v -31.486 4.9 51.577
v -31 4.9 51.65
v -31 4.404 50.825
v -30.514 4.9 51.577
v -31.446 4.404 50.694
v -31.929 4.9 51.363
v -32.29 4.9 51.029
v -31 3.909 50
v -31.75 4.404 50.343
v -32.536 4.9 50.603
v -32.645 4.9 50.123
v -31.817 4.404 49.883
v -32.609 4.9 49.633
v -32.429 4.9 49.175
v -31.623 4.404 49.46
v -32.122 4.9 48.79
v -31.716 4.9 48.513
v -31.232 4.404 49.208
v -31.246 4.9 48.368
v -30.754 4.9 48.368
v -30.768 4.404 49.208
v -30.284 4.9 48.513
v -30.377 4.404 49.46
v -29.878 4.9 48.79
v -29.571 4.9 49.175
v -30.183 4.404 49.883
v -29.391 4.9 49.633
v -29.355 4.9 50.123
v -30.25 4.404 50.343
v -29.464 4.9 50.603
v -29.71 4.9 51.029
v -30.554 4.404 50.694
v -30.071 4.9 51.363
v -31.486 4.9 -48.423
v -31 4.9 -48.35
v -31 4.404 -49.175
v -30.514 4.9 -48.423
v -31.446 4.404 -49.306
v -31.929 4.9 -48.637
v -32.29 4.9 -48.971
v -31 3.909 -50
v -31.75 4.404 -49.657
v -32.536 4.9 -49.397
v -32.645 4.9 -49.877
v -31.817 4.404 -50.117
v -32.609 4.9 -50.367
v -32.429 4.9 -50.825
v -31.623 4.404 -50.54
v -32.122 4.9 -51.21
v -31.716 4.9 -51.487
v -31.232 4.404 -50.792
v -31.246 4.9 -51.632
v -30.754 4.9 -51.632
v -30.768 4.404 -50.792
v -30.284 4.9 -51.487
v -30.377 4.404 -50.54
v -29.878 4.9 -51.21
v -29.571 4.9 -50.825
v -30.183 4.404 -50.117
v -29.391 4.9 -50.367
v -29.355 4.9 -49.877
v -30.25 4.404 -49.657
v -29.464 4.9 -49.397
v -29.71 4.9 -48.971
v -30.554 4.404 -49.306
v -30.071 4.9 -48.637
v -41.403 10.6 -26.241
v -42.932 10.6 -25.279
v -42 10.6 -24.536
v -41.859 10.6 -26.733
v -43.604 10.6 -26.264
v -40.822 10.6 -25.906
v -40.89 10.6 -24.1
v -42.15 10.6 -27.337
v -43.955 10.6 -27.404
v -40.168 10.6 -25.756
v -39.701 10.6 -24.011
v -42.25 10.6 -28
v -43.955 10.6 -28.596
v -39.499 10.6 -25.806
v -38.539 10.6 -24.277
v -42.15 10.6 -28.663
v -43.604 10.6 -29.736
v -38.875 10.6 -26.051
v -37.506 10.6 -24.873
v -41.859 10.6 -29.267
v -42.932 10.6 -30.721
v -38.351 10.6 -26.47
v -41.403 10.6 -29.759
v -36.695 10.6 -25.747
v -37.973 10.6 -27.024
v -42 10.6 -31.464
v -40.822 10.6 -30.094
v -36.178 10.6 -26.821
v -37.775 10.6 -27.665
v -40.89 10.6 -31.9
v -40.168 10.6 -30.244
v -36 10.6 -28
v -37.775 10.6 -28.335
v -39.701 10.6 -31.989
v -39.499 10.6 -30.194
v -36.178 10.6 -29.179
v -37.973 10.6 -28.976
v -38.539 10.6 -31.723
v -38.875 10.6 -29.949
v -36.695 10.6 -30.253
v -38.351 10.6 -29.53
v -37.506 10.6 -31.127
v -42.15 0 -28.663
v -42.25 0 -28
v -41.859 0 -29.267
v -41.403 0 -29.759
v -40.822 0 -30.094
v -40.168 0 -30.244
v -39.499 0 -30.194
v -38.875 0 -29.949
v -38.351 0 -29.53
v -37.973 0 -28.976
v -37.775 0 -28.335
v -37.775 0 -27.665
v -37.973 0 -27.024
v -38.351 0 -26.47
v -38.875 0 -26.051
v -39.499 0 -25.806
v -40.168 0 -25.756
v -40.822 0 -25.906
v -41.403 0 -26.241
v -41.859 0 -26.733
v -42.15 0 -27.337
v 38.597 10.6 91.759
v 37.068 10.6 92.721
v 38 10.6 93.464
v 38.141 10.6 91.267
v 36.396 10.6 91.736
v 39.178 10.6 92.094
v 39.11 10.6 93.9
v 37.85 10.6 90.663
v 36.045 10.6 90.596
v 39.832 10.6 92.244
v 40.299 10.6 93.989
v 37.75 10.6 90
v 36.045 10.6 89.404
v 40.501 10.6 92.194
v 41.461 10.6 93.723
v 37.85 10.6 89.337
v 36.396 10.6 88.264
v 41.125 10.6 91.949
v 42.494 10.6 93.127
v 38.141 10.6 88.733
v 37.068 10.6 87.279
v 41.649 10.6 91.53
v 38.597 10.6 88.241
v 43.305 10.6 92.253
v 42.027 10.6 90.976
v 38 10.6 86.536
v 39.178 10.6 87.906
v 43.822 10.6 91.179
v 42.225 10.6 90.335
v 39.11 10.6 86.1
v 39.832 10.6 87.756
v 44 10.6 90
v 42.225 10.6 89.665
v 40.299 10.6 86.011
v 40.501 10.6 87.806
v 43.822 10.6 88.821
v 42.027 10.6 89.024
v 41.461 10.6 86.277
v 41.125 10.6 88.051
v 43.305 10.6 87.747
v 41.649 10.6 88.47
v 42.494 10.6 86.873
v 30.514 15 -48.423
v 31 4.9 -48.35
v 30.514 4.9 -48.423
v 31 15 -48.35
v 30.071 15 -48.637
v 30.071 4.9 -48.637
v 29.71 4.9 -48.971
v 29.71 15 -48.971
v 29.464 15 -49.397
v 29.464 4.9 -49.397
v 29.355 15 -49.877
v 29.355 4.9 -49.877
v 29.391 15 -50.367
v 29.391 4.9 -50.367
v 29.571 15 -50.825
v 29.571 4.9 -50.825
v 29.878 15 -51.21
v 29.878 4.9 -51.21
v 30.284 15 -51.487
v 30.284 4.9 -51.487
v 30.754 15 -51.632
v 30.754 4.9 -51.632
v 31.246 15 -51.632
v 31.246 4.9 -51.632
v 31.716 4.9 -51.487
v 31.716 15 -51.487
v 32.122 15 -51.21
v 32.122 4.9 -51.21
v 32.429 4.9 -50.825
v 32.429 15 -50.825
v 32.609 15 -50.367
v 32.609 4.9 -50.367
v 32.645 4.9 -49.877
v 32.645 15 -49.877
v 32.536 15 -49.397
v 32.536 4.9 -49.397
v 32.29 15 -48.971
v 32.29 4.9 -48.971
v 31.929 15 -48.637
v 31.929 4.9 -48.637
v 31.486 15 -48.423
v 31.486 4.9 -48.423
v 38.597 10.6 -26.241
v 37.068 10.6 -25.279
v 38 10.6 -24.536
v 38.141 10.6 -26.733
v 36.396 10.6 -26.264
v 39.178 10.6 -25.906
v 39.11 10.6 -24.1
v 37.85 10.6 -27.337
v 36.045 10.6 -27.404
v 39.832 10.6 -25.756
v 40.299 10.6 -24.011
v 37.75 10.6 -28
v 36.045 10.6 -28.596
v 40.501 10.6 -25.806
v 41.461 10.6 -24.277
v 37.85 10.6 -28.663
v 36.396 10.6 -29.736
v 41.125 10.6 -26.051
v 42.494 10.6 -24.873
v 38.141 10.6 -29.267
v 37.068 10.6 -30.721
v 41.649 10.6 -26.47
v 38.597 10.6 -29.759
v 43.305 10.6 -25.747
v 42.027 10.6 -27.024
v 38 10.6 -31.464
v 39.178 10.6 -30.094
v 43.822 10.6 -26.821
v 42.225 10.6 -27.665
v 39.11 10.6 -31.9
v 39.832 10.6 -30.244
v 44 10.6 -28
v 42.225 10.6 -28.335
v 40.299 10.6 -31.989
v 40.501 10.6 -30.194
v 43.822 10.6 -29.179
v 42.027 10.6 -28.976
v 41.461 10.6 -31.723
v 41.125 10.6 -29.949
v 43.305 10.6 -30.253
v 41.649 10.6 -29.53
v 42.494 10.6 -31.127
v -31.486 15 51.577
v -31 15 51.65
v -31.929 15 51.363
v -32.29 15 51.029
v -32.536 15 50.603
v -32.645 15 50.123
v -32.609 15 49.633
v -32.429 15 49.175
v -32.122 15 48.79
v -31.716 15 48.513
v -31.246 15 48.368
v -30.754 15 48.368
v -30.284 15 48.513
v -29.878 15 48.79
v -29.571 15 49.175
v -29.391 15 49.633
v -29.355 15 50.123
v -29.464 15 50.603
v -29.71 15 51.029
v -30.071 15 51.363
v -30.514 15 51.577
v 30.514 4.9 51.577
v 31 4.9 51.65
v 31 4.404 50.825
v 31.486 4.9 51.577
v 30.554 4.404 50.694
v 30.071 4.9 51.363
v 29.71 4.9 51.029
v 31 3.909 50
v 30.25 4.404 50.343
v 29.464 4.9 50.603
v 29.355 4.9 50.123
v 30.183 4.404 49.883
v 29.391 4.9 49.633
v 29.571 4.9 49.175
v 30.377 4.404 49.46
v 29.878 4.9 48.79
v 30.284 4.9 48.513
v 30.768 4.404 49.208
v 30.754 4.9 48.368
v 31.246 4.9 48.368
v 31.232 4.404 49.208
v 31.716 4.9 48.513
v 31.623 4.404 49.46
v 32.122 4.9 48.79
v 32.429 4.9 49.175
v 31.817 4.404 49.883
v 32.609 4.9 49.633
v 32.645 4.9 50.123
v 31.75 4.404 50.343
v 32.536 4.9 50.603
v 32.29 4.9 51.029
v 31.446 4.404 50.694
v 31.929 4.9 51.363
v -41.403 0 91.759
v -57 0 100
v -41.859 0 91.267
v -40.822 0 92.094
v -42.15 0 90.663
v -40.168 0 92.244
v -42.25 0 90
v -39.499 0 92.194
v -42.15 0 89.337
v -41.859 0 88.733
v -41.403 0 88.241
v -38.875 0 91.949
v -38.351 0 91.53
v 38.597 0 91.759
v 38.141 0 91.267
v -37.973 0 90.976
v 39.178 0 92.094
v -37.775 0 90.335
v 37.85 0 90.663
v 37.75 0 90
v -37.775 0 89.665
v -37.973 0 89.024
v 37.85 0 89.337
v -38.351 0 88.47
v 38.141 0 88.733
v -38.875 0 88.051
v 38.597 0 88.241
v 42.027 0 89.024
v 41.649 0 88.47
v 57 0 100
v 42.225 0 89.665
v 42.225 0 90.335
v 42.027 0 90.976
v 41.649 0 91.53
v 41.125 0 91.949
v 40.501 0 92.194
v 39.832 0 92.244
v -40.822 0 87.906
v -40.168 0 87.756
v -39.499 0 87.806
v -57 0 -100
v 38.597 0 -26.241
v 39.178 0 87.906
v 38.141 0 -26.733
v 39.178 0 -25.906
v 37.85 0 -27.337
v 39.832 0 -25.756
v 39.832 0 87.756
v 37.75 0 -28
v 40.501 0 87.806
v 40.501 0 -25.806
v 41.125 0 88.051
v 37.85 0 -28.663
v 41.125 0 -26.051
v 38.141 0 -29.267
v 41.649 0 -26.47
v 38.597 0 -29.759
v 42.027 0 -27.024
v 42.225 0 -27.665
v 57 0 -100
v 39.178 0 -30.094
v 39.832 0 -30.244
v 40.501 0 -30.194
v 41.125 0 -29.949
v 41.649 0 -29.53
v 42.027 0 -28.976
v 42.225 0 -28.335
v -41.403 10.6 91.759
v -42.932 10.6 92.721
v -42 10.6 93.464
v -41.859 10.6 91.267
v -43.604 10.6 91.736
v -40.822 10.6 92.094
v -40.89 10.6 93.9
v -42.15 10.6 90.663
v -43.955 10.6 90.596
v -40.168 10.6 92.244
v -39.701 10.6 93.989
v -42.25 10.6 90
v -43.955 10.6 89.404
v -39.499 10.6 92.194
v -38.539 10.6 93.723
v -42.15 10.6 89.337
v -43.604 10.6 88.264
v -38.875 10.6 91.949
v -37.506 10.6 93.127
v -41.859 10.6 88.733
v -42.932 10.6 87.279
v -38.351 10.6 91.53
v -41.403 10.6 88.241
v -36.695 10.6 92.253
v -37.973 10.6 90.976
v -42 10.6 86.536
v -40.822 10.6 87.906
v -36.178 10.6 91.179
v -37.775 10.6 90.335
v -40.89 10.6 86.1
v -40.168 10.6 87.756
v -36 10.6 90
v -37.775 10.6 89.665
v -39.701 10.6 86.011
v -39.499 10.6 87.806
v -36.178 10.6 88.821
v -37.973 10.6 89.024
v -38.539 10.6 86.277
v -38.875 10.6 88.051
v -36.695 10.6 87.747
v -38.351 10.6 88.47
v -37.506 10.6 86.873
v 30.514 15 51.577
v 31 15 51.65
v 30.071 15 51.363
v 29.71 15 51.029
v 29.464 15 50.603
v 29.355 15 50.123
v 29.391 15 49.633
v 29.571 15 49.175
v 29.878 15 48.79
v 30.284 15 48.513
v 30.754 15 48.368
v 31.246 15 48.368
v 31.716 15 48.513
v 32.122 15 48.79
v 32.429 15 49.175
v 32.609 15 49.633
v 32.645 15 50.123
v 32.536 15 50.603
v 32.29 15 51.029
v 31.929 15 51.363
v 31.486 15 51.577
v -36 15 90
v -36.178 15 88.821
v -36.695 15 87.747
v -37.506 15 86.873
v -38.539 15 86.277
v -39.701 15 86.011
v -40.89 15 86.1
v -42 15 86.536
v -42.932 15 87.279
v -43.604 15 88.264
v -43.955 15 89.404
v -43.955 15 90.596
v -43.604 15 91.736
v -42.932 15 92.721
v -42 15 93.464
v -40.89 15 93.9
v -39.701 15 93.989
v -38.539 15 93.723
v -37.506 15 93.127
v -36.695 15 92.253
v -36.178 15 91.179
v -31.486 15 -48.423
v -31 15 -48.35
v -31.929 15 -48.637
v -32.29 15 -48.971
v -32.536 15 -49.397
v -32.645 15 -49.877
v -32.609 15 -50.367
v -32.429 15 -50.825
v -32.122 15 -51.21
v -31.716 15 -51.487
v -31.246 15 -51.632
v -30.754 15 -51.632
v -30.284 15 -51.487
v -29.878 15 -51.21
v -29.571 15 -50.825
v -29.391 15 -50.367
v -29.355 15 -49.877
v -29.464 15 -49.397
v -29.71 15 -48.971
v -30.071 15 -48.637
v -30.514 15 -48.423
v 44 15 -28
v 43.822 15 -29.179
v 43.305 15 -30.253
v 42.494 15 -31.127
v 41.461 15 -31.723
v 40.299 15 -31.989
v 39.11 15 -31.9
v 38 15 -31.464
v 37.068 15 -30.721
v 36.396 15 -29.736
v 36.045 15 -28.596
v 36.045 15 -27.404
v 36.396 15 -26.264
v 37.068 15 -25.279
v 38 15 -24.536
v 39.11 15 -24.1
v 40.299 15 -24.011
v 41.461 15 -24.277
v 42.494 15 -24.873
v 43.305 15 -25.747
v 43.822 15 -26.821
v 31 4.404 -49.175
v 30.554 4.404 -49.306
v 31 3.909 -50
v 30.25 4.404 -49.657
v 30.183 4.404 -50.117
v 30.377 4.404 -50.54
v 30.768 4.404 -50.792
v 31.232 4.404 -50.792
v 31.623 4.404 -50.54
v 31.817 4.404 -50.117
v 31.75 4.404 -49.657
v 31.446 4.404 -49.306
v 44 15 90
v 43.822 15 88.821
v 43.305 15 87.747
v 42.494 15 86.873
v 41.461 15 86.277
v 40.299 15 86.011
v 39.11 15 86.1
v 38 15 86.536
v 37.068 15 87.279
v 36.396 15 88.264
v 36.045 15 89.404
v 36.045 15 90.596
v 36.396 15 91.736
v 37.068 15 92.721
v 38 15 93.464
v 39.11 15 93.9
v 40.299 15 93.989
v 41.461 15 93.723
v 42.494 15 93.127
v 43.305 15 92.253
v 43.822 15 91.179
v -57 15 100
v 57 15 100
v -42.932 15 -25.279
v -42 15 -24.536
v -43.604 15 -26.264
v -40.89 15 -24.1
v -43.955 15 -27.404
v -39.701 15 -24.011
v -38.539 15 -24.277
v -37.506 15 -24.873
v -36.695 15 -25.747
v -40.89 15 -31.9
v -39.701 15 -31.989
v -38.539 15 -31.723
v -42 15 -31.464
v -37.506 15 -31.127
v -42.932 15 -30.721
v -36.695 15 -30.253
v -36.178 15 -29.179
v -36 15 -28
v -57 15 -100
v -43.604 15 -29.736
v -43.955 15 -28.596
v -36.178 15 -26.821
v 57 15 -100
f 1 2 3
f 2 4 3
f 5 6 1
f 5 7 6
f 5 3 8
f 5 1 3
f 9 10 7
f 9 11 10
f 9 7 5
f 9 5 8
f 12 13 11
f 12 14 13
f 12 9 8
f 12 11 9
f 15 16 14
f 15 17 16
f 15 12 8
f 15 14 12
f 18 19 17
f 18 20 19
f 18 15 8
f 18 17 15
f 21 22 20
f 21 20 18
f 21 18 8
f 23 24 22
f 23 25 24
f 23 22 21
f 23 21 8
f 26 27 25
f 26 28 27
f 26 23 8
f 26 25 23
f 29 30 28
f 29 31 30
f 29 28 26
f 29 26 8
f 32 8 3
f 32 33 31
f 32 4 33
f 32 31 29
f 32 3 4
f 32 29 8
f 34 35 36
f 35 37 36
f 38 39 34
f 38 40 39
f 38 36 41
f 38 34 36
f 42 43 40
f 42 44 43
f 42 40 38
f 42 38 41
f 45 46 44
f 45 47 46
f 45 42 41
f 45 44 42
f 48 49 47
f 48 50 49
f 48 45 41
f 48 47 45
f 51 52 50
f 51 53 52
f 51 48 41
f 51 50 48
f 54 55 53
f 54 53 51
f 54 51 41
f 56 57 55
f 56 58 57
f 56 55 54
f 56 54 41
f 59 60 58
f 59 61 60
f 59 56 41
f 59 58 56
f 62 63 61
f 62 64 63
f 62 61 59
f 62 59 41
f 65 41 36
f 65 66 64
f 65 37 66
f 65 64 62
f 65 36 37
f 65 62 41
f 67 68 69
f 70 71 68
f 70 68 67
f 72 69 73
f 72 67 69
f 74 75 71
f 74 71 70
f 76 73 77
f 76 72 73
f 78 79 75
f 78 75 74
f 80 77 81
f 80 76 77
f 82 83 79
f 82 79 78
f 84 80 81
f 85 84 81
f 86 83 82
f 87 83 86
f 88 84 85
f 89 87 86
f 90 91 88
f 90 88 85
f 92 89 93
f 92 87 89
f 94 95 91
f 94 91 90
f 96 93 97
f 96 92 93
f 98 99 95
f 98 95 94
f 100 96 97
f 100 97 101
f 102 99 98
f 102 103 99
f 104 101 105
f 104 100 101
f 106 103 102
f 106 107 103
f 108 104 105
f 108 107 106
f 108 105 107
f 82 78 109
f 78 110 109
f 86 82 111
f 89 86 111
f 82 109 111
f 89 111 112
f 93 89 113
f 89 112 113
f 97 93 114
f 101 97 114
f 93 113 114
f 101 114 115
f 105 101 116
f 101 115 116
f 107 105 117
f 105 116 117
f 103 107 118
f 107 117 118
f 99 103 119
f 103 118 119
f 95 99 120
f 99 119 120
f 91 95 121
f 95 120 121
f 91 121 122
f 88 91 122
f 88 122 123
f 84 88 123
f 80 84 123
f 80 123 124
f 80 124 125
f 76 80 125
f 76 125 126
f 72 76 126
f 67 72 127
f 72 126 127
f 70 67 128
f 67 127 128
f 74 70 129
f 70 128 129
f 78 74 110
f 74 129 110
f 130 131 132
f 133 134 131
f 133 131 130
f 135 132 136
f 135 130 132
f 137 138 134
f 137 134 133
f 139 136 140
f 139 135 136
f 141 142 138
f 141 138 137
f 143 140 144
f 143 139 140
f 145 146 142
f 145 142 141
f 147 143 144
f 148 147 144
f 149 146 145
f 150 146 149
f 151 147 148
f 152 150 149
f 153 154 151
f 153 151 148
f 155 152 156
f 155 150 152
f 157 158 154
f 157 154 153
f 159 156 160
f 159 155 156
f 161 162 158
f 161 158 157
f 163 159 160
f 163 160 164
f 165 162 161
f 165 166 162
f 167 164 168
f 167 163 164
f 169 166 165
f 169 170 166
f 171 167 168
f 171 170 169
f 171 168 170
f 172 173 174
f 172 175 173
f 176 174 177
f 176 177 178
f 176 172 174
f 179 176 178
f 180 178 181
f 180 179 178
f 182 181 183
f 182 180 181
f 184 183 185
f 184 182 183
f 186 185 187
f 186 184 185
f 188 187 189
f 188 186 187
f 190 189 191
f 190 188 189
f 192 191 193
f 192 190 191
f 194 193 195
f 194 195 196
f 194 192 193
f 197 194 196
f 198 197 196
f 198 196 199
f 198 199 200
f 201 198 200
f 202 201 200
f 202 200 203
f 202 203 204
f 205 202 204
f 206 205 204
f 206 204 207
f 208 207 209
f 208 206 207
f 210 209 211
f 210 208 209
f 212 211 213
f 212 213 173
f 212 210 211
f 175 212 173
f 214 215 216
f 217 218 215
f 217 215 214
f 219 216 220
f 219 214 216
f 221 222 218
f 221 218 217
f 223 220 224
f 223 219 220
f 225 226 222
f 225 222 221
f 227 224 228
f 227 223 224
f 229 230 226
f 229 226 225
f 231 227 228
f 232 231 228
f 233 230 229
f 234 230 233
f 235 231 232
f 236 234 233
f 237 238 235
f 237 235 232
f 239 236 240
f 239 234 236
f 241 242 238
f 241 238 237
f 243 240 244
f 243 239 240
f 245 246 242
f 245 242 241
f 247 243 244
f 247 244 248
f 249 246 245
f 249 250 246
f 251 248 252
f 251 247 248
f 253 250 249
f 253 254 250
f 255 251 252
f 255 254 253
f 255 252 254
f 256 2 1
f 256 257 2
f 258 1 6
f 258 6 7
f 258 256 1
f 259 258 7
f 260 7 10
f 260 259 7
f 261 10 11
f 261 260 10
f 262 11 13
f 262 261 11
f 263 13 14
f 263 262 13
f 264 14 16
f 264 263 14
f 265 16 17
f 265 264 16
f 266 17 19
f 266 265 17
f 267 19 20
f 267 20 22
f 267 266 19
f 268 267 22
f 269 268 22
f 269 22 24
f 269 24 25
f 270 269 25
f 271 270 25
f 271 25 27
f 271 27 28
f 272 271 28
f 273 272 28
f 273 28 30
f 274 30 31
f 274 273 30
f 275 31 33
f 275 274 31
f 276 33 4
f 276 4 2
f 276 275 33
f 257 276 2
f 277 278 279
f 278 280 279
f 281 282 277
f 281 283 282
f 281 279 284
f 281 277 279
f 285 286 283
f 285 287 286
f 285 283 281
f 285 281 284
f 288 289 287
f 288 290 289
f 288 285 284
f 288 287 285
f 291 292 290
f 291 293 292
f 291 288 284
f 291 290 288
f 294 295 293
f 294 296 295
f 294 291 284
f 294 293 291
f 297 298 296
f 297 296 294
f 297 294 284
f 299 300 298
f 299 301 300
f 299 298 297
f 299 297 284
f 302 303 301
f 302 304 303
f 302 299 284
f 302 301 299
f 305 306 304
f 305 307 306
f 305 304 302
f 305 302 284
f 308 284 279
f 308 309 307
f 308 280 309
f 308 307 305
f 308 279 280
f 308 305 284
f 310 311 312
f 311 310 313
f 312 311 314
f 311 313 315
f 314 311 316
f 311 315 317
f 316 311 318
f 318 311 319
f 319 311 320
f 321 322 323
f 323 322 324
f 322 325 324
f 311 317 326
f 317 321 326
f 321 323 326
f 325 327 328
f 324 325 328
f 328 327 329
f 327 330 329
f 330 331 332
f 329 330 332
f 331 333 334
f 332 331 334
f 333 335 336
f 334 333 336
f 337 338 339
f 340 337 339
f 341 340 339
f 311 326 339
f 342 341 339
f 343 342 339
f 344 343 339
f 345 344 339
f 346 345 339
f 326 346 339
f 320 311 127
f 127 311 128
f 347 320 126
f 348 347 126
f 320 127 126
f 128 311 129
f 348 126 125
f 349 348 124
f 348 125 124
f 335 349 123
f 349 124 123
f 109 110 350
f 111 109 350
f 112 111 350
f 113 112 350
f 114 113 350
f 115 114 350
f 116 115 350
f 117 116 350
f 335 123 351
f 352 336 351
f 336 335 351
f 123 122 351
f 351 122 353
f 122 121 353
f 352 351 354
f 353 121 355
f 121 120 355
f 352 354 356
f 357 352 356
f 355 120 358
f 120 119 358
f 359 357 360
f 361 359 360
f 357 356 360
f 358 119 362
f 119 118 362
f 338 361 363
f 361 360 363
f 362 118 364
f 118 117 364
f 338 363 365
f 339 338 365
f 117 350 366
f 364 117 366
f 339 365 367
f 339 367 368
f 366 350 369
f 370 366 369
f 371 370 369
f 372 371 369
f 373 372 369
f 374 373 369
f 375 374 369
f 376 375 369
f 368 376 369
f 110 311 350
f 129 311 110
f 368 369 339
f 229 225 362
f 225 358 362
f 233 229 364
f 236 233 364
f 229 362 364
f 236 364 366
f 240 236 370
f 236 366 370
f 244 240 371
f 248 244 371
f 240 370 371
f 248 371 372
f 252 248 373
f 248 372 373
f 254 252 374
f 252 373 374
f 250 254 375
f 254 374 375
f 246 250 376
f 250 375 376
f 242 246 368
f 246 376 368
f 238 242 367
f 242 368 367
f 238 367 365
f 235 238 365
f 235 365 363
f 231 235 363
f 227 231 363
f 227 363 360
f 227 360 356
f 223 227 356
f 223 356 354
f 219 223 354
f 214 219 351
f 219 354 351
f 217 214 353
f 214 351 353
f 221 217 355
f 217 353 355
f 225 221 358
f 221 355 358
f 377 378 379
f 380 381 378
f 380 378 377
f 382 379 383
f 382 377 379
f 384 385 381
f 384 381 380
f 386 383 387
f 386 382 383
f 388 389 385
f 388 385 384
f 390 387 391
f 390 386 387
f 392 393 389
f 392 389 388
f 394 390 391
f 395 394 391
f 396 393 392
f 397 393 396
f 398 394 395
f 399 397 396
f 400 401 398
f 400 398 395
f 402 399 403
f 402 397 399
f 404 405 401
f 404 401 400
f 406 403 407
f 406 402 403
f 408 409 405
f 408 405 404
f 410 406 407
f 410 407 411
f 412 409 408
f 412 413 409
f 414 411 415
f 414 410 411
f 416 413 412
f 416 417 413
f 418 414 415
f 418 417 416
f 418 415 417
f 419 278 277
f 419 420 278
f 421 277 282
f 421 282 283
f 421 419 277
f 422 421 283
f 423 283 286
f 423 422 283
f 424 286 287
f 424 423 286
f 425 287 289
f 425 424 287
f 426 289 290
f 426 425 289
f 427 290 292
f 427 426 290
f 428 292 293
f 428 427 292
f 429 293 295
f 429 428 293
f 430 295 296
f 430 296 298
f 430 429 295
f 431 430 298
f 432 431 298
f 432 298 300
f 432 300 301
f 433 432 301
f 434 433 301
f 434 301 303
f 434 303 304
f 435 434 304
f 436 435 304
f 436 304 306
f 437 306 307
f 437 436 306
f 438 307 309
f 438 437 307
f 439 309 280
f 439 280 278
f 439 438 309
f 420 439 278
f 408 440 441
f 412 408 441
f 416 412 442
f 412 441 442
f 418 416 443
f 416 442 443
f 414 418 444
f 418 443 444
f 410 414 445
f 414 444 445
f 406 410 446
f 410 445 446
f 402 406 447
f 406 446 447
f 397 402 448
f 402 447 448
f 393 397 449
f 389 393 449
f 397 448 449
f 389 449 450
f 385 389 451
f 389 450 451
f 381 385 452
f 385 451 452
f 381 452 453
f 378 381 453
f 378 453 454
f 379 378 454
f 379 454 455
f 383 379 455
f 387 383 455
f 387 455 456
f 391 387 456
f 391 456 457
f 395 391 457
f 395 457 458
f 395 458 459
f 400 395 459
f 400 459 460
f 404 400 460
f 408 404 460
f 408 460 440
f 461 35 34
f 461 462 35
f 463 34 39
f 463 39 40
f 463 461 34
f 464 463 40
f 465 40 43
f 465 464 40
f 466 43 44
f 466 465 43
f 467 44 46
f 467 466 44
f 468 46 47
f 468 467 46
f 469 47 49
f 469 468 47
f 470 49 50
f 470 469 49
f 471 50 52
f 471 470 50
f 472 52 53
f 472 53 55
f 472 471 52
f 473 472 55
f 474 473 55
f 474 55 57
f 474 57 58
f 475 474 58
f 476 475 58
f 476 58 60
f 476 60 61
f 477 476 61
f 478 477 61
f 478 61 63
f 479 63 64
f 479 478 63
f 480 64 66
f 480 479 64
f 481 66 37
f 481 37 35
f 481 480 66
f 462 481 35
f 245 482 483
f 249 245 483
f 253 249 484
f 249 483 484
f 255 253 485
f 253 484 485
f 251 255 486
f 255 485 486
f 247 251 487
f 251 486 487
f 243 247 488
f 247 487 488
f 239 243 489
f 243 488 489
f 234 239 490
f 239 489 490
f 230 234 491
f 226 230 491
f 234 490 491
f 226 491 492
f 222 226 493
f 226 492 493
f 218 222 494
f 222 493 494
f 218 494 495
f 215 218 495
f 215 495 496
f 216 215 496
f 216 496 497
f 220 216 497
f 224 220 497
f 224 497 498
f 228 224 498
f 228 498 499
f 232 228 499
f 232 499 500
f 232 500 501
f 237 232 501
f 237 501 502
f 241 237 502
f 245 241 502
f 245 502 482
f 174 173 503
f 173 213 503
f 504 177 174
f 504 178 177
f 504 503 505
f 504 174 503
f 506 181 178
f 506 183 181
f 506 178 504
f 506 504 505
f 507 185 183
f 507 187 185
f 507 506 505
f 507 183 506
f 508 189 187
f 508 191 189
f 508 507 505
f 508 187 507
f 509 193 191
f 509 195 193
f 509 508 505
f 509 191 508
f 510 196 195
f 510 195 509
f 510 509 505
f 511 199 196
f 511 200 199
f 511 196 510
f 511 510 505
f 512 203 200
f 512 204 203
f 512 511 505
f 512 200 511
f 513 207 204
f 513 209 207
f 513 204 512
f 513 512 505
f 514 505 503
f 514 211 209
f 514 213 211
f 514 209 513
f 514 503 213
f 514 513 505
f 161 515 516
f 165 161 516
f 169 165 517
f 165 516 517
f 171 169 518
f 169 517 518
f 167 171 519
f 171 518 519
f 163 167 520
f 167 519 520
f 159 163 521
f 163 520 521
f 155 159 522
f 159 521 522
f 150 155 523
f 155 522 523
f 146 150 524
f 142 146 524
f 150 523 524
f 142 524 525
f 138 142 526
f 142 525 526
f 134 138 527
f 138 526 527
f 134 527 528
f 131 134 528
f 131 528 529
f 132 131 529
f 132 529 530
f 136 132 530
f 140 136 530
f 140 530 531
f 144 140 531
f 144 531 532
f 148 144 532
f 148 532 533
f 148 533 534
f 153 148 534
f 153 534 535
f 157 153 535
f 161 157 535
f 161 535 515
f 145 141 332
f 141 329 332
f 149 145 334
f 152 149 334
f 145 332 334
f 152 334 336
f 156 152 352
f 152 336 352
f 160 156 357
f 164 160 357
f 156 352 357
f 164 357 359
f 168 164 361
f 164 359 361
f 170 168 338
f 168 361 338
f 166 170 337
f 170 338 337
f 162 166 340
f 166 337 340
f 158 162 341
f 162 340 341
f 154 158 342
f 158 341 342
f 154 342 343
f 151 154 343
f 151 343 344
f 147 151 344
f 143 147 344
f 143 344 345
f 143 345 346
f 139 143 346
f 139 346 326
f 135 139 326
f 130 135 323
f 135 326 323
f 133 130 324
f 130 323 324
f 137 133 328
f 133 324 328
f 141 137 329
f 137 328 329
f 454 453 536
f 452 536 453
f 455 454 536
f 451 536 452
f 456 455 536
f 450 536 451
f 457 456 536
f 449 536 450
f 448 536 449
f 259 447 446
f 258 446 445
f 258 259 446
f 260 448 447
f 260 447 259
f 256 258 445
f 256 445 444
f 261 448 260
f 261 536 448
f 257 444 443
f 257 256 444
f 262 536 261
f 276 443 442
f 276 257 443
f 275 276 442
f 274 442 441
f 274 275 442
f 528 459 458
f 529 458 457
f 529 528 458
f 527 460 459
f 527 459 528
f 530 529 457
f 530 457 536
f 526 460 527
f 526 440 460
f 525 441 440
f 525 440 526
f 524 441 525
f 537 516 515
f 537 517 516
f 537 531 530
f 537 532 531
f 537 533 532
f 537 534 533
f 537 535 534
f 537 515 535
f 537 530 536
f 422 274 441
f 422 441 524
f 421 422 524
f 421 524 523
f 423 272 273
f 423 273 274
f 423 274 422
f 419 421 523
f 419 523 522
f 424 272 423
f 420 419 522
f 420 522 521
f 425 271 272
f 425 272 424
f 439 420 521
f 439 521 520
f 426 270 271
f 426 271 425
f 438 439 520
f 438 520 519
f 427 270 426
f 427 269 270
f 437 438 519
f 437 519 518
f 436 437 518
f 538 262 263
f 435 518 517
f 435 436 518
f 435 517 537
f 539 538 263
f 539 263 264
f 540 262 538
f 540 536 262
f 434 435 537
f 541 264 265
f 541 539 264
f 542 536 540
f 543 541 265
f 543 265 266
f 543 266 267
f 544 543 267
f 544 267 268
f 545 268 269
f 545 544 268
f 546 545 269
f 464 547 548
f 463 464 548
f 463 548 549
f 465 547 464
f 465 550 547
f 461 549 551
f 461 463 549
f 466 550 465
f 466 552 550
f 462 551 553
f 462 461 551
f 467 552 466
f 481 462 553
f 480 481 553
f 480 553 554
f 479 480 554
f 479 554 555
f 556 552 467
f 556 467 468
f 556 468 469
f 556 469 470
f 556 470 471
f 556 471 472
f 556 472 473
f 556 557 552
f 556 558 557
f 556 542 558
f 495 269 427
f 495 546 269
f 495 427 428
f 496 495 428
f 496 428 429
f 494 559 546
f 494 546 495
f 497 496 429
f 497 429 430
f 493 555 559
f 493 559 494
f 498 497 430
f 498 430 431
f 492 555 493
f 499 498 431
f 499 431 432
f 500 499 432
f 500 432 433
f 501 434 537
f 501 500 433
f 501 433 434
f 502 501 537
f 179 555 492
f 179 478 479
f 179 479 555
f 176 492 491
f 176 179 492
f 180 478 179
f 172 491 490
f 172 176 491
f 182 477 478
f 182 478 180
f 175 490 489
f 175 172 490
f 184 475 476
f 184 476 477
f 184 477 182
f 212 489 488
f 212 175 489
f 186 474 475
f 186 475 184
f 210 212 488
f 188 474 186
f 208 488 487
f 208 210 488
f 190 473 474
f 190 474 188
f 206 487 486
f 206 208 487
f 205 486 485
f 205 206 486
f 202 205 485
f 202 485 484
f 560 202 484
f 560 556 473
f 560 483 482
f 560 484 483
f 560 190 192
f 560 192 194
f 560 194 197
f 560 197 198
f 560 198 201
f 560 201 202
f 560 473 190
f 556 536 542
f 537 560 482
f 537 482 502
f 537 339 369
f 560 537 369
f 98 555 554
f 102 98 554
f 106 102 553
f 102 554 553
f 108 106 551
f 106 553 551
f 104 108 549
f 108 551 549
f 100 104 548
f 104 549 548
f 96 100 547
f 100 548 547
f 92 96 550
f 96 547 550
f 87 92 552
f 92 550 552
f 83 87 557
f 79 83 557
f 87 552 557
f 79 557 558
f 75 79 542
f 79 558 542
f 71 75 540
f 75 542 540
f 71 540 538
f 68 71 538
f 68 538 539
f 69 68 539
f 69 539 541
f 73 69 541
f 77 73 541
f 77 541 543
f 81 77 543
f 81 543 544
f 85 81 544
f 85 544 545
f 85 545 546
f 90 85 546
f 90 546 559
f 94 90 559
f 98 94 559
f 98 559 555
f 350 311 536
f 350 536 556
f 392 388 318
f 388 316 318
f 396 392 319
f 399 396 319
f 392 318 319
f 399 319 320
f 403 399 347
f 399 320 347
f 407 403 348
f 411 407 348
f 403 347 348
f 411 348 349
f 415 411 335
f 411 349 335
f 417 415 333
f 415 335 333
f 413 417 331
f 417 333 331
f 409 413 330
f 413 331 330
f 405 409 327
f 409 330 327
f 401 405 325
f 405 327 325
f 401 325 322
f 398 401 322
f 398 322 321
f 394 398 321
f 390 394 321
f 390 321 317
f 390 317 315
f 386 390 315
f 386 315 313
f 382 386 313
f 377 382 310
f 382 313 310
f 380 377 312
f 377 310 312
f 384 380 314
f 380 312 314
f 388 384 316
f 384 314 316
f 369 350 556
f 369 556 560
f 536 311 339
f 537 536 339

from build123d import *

# Parameters (mm, degrees)
SKETCH_1_W                   = 114
SKETCH_1_H                   = 200
EXTRUDE_1_DEPTH              = 15
HOLE_WIZARD_M4_1_D           = 4.5
HOLE_WIZARD_M4_1_CBORE_D     = 8
HOLE_WIZARD_M4_1_CBORE_DEPTH = 4.4
PATTERN_LINEAR_1_COUNT       = 2
PATTERN_LINEAR_1_PITCH       = 118
PATTERN_LINEAR_1_COUNT_DIR2  = 2
PATTERN_LINEAR_1_PITCH_DIR2  = 80
PATTERN_LINEAR_3_COUNT       = 2
PATTERN_LINEAR_3_PITCH       = 100
PATTERN_LINEAR_3_COUNT_DIR2  = 2
PATTERN_LINEAR_3_PITCH_DIR2  = 62


with BuildPart() as part:
    # 草图1 → 凸台-拉伸1 (new body)
    with BuildSketch(Plane(origin=(0, 0, 0), x_dir=(1, 0, 0), z_dir=(0, 1, 0))):
        Rectangle(SKETCH_1_W, SKETCH_1_H)
    extrude(amount=EXTRUDE_1_DEPTH)

    # Hole Wizard M4 _1 (through all)
    with Locations(Plane(origin=(0, 15, 0), x_dir=(1, 0, 0), z_dir=(0, 1, 0))):
        with Locations((-40, -90)):
            hole_wizard_m4_1 = CounterBoreHole(HOLE_WIZARD_M4_1_D / 2, HOLE_WIZARD_M4_1_CBORE_D / 2, HOLE_WIZARD_M4_1_CBORE_DEPTH)

    # 阵列(线性)1: Hole Wizard M4 _1 2 × 2
    with Locations(*[(j * PATTERN_LINEAR_1_PITCH_DIR2, 0, -i * PATTERN_LINEAR_1_PITCH) for i in range(PATTERN_LINEAR_1_COUNT) for j in range(PATTERN_LINEAR_1_COUNT_DIR2) if (i, j) != (0, 0)]):
        add(hole_wizard_m4_1, mode=Mode.SUBTRACT)

    # 草图6 → Hole Wizard M4 _1 2 (revolve, cut)
    with BuildSketch(Plane(origin=(-31, 15, 50), x_dir=(0, 0, 1), z_dir=(1, 0, 0))):
        Polygon((0, 0), (0, 11.091420021), (1.65, 10.1), (1.65, 0), align=None)
    hole_wizard_m4_1_2 = revolve(axis=Axis((-31, 21.35, 50), (0, -1, 0)), mode=Mode.SUBTRACT)

    # 阵列(线性)3: Hole Wizard M4 _1 2 2 × 2
    with Locations(*[(j * PATTERN_LINEAR_3_PITCH_DIR2, 0, -i * PATTERN_LINEAR_3_PITCH) for i in range(PATTERN_LINEAR_3_COUNT) for j in range(PATTERN_LINEAR_3_COUNT_DIR2) if (i, j) != (0, 0)]):
        add(hole_wizard_m4_1_2, mode=Mode.SUBTRACT)


solid = part.part
